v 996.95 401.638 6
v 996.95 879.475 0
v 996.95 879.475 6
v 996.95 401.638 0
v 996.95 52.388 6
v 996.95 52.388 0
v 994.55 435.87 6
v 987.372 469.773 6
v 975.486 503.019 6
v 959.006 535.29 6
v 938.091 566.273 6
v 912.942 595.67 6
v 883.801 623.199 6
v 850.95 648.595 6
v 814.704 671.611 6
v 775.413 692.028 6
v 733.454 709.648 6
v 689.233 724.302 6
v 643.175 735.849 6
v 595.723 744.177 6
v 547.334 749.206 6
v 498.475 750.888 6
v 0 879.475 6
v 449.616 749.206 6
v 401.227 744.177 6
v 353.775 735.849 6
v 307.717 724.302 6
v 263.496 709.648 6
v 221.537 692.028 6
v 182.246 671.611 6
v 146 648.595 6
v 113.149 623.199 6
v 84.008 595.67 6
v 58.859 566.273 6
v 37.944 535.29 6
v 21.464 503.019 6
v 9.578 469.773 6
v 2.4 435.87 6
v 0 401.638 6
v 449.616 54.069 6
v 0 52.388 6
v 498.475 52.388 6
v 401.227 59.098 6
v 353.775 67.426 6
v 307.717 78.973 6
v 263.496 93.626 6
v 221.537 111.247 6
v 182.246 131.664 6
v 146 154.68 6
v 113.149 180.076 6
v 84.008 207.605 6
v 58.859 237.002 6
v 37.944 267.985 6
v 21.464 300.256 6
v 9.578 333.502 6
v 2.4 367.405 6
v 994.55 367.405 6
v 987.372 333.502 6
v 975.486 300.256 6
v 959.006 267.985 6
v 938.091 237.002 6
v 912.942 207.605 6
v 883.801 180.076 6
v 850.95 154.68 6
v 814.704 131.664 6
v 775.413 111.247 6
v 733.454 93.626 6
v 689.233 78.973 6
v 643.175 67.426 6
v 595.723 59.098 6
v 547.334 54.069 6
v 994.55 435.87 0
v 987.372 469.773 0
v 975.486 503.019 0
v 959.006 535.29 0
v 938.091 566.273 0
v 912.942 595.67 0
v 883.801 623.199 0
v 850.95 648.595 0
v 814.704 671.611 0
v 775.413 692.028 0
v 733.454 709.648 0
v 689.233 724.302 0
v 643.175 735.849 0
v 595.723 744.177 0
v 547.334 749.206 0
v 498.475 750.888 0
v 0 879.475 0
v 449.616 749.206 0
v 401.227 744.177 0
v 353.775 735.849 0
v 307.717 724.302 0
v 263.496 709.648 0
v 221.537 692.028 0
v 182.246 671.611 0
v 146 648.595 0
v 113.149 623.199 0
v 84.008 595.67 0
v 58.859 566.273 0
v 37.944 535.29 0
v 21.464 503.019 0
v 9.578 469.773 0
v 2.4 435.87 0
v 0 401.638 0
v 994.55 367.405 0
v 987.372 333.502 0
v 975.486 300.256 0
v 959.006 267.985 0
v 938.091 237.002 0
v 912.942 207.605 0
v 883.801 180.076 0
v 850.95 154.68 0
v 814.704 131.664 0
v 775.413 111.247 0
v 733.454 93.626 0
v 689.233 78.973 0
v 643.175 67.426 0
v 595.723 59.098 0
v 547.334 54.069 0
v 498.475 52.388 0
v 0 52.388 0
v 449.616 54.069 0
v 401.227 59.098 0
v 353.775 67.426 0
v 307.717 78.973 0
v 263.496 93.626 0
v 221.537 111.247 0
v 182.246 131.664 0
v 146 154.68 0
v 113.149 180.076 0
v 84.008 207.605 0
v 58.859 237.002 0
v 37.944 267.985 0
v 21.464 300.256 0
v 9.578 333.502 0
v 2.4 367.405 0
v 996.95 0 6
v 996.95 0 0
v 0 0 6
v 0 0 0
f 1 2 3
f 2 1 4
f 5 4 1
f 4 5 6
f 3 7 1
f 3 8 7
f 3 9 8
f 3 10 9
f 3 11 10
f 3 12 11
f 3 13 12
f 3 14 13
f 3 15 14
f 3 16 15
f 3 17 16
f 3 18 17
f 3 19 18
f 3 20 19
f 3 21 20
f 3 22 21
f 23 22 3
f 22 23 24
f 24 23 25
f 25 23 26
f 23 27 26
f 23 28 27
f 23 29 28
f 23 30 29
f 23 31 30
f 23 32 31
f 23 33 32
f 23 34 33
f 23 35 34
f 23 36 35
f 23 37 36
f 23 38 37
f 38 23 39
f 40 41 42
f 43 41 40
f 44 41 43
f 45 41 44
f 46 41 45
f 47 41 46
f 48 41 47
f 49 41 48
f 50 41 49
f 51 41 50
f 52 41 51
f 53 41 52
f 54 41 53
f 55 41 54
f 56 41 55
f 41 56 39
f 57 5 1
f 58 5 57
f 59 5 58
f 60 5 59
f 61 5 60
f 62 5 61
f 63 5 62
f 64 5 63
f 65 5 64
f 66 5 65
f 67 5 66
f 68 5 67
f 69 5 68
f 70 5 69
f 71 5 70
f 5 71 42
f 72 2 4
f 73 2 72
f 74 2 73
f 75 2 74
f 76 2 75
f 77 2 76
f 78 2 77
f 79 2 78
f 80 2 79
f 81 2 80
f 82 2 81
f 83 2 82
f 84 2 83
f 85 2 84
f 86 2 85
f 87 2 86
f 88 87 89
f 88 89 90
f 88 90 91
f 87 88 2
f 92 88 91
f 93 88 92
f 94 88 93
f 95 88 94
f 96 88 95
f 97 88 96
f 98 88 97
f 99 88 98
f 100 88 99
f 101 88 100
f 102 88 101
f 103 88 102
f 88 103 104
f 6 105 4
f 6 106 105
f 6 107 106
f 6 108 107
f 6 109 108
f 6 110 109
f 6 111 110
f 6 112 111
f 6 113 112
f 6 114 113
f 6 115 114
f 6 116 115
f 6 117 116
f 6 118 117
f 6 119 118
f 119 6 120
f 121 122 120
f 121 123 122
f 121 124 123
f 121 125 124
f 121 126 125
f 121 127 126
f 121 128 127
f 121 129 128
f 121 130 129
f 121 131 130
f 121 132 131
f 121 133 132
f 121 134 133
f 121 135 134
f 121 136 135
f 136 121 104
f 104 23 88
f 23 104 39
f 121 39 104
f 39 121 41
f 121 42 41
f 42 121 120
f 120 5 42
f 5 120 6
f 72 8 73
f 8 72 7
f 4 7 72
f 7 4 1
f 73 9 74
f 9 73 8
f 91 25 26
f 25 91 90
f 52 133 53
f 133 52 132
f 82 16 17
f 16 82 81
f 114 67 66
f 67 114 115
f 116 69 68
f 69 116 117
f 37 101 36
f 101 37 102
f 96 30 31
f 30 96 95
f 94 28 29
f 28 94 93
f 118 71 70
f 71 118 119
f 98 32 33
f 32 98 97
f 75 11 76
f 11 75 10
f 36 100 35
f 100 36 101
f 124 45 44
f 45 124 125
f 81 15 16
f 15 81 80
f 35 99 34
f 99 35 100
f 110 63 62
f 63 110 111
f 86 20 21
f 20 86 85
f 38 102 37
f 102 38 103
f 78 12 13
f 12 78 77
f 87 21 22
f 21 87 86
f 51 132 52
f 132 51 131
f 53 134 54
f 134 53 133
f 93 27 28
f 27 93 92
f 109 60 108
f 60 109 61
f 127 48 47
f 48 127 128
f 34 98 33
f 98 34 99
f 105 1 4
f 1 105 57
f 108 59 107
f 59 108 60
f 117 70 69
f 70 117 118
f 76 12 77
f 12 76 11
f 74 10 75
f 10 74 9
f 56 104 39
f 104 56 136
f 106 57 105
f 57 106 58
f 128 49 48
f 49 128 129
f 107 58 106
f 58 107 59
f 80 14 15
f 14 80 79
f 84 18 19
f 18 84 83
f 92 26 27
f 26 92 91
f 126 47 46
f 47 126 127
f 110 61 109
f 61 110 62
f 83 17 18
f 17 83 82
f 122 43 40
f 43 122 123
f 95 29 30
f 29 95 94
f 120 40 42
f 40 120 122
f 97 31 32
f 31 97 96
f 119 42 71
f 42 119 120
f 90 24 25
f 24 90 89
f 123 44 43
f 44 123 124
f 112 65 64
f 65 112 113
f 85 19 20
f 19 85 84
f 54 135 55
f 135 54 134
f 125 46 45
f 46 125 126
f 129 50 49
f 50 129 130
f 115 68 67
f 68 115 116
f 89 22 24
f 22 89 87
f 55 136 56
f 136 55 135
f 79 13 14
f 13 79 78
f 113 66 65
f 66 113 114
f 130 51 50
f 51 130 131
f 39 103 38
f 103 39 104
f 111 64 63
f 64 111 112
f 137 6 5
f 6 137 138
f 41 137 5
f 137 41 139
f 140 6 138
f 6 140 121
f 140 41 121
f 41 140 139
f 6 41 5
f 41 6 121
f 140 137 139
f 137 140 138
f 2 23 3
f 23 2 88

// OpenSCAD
$inch = 25.4;
function inches(mm) = ($inch*mm);


// offsets of section we will cut this time
$section_x = 0;
$section_y = 0;

// shape of window
$x = inches(39.25);
$y = inches(27.5);

// size of cutting area
$cut_x = inches(90);
$cut_y = inches(100);


$bottom_reveal=inches(2  + 1/16);
$top_reveal=inches(5 + 1/16);

$h = 6;
$fn=64;          
            
module oval(x,y, height, center = true) {
   scale([1, y/x, 1]) cylinder(h=height, r=x, center=center);
}

module cutting_template(x_offset, y_offset) {
    translate([0,0,-1]) {
        difference()  {
            cube([inches(100), inches(100), $h*5]);
            translate([x_offset, y_offset, -1]) {
                cube([$cut_x, $cut_y, $h*5 + 2]);
            }
        }  
    }
}

module grab_cuttable_area(x,y) {
    difference() {
        make_window_surround();
        cutting_template(x,y);  
    }   
}

module make_window_surround() {
    union() {
        translate([0,$bottom_reveal,0]) {
            difference() {
                cube([$x, $y, $h]);
                translate([$x/2, $y/2, -1]) {
                    oval($x/2,$y/2, $h+2, false);
                }
            }
        }
        cube([$x, $bottom_reveal, $h]);
        translate([0,$y+$bottom_reveal,0]) {
            cube([$x, $top_reveal, $h]);
        }
    }
}

grab_cuttable_area($cut_x*$section_x,0);
